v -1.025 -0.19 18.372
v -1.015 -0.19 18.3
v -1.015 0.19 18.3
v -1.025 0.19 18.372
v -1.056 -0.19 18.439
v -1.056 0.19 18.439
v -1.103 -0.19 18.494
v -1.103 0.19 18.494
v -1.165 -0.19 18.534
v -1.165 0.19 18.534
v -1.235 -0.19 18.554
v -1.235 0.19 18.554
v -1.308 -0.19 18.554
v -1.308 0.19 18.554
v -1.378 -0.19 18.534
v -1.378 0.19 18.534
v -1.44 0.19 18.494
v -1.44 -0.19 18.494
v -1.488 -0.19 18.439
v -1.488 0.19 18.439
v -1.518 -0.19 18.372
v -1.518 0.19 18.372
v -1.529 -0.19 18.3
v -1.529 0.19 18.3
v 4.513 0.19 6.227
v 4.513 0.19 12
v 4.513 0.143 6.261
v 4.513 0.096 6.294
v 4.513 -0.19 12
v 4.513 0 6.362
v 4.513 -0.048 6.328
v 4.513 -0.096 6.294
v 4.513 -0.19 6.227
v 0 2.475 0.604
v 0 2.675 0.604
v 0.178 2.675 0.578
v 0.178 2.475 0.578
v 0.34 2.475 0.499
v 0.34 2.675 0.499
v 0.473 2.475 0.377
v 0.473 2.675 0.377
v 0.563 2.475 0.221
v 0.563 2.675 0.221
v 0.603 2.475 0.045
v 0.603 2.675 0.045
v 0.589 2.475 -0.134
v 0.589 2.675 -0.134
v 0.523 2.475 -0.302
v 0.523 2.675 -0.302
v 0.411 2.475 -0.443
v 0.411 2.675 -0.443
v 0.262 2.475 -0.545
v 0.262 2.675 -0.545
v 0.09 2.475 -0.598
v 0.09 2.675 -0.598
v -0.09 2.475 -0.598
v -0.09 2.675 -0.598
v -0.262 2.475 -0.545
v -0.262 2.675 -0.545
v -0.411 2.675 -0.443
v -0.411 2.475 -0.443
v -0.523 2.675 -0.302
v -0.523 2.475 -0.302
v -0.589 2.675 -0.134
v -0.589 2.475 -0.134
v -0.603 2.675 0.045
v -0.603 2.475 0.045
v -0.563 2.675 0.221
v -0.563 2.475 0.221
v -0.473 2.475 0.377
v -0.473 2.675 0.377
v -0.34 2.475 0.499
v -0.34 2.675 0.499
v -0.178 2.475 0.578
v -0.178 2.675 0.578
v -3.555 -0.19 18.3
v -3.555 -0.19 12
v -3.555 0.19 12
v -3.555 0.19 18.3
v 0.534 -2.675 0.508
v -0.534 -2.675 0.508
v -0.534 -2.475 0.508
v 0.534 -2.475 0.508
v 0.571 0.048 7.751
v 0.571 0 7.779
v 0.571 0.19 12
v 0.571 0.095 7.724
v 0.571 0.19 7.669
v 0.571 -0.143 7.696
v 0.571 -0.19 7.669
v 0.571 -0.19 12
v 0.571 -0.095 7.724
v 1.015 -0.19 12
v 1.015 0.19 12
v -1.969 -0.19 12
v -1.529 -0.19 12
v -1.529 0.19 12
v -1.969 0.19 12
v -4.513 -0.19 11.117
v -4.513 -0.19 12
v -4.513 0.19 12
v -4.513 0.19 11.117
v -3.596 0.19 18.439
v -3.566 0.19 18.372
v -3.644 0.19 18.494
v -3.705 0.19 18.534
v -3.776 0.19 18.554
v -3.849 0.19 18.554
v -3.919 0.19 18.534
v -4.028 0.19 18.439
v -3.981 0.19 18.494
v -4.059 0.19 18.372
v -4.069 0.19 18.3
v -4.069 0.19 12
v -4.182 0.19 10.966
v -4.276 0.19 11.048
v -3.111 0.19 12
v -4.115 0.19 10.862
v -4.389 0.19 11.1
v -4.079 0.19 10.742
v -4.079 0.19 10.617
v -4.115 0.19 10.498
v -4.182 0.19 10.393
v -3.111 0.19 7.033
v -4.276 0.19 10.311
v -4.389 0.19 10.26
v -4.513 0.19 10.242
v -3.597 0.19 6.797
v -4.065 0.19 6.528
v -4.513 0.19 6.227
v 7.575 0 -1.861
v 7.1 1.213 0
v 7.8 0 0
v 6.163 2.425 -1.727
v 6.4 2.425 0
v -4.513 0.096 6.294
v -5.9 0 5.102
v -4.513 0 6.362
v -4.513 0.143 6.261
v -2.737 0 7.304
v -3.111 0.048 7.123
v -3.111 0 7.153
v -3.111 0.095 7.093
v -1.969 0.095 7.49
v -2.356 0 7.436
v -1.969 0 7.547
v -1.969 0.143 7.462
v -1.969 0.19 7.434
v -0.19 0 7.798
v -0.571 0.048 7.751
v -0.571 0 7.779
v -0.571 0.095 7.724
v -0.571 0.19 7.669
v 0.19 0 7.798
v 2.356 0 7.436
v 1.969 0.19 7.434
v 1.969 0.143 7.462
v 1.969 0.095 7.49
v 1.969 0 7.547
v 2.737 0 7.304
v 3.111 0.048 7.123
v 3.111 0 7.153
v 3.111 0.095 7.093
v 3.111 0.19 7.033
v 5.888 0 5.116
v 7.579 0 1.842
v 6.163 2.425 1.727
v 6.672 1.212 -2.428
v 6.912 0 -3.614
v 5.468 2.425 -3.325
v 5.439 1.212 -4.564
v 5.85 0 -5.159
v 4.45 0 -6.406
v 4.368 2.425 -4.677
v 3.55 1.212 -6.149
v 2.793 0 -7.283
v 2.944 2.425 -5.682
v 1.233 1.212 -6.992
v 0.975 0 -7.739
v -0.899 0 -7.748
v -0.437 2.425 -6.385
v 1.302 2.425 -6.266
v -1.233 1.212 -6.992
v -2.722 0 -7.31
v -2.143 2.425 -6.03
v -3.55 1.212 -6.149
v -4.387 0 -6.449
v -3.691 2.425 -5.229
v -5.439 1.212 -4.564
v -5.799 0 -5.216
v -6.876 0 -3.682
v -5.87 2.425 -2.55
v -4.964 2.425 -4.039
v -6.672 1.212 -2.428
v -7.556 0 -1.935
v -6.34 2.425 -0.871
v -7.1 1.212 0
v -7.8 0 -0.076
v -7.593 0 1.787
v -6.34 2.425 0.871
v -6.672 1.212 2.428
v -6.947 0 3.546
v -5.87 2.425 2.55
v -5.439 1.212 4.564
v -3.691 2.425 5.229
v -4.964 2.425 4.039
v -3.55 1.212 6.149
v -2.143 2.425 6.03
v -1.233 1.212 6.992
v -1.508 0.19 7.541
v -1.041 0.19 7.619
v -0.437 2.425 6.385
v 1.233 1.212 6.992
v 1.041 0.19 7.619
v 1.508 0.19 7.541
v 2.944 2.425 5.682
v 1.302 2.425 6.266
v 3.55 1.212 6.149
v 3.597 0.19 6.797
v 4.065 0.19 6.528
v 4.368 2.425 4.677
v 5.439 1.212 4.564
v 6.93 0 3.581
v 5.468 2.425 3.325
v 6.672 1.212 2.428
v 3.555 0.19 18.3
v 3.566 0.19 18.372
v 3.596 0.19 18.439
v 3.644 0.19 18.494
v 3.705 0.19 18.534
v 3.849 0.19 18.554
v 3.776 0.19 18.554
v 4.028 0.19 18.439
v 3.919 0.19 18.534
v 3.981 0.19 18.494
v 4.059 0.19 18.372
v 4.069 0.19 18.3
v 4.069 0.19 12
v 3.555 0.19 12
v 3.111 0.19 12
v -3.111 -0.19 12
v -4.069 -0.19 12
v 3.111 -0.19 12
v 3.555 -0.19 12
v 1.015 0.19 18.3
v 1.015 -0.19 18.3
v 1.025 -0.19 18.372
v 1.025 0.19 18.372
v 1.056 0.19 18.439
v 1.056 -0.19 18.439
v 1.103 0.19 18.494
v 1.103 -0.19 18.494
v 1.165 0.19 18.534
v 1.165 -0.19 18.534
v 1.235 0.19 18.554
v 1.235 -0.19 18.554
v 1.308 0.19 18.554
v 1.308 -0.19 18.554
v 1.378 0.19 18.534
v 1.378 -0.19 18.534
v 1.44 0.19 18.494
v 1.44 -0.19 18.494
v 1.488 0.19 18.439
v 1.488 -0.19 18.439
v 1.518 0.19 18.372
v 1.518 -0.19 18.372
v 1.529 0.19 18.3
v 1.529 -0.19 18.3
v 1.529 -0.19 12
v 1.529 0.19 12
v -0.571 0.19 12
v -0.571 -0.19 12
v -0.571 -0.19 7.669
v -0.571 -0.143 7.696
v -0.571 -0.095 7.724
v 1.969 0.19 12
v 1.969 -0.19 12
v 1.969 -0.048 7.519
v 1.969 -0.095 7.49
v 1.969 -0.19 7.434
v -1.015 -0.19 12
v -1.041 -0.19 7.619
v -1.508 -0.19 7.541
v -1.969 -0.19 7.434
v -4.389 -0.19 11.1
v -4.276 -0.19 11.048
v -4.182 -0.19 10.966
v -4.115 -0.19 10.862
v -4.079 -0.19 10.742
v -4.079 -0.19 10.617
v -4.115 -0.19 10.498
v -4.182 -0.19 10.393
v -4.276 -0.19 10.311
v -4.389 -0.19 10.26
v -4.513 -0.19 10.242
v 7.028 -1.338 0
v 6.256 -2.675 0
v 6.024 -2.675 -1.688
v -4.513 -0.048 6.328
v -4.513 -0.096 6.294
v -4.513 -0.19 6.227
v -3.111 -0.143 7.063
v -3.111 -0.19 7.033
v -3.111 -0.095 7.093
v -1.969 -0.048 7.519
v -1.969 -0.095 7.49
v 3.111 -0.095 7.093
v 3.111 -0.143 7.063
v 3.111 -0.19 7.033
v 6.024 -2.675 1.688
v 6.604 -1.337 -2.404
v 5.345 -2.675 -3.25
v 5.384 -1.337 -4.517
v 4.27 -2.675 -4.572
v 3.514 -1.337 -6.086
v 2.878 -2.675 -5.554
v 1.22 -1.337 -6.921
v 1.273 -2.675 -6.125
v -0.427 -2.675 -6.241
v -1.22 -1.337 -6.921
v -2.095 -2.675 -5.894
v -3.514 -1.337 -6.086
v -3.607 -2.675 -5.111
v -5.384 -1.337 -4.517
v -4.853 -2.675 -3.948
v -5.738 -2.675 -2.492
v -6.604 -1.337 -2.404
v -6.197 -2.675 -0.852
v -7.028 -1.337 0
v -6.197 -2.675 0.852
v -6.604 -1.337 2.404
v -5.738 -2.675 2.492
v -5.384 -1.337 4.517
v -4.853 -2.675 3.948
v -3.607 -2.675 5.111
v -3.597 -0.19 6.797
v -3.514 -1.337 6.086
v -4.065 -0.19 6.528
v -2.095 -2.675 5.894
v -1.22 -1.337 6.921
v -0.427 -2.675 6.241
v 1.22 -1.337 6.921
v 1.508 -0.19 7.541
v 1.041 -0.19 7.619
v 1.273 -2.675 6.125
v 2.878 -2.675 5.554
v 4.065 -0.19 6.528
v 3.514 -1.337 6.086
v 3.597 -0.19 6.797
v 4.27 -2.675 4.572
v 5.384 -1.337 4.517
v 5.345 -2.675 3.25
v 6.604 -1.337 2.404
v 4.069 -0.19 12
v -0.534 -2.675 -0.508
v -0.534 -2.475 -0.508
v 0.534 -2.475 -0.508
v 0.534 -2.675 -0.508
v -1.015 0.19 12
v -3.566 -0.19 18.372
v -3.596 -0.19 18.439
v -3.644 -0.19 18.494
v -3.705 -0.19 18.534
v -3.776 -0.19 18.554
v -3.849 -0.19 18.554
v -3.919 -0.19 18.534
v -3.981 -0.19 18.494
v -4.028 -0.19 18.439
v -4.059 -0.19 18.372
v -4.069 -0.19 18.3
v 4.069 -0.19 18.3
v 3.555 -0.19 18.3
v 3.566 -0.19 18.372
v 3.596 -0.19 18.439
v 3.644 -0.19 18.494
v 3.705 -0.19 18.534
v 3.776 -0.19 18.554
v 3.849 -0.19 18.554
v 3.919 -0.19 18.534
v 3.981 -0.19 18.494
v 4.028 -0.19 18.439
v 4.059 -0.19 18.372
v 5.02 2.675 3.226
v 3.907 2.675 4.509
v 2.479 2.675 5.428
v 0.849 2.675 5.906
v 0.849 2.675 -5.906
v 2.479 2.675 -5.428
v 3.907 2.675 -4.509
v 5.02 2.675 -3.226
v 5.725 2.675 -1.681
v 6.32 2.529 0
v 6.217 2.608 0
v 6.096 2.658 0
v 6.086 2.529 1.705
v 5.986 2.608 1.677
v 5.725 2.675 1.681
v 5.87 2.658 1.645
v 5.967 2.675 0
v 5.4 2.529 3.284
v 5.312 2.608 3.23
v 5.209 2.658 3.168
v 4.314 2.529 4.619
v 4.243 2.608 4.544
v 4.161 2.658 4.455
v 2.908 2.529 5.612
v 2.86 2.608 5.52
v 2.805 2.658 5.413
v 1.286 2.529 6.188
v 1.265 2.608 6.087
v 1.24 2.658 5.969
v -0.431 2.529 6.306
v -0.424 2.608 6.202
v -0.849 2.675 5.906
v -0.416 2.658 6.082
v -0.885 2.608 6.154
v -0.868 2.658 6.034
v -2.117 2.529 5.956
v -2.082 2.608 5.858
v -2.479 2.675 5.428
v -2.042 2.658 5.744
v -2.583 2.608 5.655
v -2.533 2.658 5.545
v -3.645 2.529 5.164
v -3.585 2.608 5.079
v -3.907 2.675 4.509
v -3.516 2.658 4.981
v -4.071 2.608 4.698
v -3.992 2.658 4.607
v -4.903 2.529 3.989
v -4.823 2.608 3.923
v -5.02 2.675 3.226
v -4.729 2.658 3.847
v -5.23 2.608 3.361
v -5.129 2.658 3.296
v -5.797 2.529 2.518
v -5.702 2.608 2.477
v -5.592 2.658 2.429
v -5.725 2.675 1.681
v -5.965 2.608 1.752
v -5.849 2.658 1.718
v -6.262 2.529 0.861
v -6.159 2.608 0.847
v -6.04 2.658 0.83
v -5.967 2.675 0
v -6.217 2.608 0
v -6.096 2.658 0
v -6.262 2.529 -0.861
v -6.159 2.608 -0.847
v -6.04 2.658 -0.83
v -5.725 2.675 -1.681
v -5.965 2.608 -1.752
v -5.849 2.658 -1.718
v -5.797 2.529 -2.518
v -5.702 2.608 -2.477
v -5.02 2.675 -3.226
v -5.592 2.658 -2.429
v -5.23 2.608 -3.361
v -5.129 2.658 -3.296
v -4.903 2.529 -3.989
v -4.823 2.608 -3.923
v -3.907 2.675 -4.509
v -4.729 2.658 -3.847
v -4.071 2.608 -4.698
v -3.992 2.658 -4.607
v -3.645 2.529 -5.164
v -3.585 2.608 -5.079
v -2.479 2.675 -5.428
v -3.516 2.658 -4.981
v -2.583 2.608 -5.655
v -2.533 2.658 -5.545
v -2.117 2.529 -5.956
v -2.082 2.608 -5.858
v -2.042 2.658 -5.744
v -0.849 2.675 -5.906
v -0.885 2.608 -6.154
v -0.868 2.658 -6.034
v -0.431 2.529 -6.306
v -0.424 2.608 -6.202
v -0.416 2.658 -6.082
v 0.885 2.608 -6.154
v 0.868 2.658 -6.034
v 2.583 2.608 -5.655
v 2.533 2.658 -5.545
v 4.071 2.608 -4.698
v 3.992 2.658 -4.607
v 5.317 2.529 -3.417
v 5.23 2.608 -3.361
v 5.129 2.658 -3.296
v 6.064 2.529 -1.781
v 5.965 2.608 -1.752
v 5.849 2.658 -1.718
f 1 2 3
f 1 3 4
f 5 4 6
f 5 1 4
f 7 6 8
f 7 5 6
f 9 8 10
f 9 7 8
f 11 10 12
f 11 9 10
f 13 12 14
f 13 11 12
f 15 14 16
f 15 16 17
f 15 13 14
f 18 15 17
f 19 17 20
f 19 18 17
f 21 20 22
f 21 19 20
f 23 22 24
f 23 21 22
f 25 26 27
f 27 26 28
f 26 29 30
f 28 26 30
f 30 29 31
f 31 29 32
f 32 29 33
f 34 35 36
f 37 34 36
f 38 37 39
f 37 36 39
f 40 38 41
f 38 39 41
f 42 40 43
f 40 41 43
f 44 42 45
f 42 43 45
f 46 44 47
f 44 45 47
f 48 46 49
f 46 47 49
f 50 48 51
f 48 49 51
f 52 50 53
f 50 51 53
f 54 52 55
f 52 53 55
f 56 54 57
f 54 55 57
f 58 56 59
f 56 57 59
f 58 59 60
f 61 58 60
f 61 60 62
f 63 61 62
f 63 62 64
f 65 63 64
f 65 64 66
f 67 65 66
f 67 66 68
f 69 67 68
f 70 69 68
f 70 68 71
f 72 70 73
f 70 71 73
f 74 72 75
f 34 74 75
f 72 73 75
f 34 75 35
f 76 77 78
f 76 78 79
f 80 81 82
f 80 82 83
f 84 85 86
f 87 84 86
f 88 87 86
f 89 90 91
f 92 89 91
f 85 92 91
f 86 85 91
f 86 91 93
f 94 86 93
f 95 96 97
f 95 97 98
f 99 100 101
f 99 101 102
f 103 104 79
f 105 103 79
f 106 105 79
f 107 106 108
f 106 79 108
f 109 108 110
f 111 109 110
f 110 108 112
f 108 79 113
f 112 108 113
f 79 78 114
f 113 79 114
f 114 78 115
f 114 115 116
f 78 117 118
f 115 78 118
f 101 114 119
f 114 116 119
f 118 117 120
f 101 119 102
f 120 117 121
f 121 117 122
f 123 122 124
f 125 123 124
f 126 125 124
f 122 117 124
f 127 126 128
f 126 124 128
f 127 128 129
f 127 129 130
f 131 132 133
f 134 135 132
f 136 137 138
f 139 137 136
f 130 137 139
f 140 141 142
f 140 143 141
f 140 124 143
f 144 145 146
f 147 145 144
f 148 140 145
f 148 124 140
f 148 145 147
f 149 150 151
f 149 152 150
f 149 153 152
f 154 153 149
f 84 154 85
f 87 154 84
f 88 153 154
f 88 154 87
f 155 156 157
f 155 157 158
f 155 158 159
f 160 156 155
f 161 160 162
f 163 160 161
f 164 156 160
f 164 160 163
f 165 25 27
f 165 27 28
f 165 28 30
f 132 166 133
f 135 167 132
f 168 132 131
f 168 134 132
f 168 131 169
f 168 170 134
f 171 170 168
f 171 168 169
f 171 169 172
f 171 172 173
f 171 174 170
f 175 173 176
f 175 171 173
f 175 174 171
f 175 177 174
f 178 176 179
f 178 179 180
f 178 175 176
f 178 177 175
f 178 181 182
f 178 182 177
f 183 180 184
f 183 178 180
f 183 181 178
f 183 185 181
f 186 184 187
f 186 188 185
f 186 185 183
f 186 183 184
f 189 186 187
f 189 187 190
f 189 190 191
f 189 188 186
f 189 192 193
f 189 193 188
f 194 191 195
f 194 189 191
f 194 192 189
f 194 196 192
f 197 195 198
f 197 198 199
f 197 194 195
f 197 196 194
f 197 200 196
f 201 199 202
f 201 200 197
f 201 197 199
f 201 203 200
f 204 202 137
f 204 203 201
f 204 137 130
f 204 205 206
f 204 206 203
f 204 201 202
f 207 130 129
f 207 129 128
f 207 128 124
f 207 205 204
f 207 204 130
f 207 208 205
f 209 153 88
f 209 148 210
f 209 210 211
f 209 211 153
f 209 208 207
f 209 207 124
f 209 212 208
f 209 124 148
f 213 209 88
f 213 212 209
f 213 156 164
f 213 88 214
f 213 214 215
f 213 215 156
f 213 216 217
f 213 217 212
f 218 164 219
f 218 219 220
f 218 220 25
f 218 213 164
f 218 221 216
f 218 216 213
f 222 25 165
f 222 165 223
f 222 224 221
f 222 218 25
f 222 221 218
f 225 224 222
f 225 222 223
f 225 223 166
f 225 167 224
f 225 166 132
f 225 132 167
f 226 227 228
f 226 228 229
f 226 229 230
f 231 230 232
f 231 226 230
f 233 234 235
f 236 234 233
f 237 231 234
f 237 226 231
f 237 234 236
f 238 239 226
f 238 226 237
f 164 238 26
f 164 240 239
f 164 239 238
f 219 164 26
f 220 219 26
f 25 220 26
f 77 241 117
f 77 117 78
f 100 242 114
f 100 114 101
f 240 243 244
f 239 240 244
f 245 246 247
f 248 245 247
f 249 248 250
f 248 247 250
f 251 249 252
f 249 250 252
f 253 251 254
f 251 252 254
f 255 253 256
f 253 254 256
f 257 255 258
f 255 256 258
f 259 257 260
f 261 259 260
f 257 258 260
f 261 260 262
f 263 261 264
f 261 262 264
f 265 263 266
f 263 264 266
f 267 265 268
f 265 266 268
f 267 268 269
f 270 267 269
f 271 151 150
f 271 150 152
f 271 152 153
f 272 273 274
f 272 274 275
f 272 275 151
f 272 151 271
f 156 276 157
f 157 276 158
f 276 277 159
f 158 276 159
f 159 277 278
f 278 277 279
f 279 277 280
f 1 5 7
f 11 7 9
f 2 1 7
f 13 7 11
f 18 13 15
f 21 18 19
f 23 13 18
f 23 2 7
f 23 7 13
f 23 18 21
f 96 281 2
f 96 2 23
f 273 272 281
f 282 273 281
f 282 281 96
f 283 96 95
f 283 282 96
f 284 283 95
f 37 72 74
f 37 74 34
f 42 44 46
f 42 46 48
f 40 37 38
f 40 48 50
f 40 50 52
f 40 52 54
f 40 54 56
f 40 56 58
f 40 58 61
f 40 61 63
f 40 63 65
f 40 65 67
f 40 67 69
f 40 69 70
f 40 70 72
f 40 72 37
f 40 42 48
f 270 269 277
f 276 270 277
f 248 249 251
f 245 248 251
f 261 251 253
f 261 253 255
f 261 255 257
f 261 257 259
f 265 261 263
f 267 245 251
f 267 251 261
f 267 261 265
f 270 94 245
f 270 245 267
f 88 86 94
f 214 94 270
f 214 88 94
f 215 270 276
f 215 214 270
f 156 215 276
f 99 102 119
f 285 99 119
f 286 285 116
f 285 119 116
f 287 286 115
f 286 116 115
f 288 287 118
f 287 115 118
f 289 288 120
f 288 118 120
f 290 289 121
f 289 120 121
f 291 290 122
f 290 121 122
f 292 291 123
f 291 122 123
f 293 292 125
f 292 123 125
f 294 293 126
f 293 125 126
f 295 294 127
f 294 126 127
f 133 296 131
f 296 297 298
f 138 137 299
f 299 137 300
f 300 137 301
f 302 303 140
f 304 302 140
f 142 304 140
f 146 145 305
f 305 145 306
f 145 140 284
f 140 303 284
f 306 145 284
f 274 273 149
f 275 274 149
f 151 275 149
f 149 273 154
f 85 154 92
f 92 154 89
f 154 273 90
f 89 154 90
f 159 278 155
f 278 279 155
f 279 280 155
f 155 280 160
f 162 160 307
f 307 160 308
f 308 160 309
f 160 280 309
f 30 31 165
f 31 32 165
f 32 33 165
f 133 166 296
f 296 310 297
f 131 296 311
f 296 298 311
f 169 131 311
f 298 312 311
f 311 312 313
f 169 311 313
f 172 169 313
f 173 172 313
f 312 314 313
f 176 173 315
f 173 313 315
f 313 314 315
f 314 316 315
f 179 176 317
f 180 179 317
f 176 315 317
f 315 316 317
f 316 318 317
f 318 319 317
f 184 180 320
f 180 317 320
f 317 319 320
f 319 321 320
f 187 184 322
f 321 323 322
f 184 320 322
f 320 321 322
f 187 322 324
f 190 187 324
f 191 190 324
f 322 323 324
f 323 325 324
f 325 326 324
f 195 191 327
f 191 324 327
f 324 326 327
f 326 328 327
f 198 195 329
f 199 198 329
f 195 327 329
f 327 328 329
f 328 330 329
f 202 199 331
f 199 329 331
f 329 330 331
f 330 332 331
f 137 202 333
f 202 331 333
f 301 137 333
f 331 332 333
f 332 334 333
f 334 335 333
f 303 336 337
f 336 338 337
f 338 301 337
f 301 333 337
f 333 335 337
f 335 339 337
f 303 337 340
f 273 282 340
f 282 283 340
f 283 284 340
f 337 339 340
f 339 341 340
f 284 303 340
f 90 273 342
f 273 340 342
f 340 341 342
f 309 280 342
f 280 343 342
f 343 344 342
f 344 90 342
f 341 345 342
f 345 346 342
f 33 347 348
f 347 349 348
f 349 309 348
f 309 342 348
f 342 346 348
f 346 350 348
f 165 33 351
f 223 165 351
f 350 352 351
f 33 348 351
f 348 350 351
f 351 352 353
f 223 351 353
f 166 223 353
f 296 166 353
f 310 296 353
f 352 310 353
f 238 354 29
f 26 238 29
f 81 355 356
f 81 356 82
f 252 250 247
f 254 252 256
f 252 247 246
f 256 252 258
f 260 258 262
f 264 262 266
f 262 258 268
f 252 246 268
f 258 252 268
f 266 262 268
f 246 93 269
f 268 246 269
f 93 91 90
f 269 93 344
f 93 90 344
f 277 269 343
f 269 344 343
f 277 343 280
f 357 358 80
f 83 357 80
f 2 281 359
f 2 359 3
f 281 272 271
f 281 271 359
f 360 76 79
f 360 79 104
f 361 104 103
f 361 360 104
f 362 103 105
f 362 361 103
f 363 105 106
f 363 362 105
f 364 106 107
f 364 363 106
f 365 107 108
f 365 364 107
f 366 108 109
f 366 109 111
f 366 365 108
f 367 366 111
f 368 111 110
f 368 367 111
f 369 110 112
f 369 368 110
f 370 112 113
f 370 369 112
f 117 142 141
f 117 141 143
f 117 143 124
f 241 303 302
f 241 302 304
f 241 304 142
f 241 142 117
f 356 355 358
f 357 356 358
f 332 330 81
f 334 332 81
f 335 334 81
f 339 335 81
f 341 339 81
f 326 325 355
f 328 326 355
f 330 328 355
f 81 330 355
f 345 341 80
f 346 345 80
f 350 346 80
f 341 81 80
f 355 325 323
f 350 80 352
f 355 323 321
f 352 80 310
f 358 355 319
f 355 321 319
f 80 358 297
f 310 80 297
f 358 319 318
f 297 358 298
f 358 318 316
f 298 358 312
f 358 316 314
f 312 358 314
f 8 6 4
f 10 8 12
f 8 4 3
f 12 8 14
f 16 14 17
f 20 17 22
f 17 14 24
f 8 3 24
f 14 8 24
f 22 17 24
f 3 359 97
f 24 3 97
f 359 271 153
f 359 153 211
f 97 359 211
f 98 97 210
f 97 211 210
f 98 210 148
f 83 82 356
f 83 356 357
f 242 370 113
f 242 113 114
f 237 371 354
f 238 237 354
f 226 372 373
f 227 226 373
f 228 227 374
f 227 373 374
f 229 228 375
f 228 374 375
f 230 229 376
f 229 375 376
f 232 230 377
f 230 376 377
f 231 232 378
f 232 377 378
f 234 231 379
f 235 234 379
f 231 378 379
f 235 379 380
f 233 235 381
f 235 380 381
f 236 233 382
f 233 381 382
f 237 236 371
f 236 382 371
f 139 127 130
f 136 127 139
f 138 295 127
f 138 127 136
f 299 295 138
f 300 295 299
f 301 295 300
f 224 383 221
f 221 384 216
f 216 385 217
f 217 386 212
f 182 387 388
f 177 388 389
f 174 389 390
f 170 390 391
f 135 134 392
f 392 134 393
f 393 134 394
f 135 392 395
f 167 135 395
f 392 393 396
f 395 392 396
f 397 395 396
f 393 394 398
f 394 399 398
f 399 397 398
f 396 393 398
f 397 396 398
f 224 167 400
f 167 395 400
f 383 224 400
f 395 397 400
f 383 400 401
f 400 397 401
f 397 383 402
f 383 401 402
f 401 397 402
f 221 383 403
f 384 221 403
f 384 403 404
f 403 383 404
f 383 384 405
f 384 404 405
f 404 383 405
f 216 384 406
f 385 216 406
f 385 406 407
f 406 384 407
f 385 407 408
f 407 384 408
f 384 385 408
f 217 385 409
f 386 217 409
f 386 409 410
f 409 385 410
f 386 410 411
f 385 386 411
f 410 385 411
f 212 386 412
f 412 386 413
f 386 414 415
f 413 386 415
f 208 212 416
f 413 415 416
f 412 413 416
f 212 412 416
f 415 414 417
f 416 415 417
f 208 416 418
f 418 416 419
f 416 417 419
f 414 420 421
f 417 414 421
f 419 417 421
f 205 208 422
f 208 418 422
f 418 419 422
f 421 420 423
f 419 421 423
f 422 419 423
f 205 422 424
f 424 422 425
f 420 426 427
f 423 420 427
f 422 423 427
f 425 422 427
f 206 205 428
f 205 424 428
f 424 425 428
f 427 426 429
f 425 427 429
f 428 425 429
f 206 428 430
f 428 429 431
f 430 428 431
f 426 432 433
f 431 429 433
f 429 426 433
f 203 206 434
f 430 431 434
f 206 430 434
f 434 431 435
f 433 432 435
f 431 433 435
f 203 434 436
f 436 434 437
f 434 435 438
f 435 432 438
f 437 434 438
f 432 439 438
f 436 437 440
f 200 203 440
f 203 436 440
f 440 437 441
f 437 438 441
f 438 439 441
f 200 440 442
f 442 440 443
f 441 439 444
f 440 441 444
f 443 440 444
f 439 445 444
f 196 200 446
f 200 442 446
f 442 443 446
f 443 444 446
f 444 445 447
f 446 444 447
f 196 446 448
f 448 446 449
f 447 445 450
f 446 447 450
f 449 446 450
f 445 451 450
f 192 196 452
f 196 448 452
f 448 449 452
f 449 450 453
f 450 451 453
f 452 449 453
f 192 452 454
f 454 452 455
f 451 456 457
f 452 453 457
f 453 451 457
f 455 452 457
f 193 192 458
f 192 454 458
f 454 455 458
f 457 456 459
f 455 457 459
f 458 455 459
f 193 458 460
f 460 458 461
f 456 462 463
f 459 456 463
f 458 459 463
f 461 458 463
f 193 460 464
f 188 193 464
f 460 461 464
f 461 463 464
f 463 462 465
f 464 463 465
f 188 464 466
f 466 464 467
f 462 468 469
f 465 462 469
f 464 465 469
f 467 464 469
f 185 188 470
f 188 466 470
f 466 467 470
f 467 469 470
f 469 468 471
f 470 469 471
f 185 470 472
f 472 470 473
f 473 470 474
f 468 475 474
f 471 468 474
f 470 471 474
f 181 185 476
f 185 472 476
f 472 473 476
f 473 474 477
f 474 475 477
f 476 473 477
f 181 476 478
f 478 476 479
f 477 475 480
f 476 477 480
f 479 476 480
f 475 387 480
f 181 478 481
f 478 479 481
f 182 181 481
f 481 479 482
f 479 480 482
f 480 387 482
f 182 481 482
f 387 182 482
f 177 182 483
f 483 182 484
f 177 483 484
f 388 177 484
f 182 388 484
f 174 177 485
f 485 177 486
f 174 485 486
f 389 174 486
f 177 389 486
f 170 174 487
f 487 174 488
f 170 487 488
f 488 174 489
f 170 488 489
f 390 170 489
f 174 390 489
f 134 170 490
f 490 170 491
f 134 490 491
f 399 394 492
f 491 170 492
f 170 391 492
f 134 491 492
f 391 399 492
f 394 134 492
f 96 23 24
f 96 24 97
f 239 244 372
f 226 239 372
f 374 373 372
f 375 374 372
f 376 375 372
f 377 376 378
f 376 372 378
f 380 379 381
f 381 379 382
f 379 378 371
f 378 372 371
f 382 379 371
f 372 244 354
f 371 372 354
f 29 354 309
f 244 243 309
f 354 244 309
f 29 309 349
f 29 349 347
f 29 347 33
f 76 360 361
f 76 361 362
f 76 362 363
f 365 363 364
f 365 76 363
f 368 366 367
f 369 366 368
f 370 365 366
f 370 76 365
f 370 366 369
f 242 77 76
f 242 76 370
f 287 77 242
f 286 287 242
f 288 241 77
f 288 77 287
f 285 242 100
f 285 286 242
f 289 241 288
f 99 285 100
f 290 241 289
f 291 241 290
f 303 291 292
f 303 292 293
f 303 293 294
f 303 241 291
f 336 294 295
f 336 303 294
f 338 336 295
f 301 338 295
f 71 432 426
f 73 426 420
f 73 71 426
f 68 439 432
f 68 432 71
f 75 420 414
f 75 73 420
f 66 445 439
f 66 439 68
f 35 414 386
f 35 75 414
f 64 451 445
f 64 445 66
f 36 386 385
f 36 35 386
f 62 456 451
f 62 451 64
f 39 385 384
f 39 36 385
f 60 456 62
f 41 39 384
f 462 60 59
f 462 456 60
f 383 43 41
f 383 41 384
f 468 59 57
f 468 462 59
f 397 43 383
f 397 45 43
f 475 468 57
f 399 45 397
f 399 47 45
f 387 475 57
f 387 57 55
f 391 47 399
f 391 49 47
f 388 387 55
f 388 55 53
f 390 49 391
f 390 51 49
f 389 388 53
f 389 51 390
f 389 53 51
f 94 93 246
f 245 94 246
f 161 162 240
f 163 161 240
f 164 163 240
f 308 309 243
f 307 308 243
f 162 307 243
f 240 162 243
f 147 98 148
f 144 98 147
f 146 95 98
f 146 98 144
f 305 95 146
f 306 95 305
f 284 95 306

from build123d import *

# Parameters (mm, degrees)
ESQUISSE1_R                  = 7.8
BOSS_EXTRU_1_DEPTH           = 2.675
BOSS_EXTRU_1_TAPER           = 30
BOSS_EXTRU_1_OTHER_WAY_DEPTH = 2.675
BOSS_EXTRU_1_OTHER_WAY_TAPER = 30
BOSS_EXTRU_2_DEPTH           = 0.19
BOSS_EXTRU_2_DEPTH_BACK      = 0.19
ENL_V_MAT_EXTRU_1_DEPTH      = 1.19
ESQUISSE4_R                  = 0.604402157
ENL_V_MAT_EXTRU_2_DEPTH      = 0.2
ESQUISSE5_W                  = 1.06783848
ESQUISSE5_H                  = 1.016251764
ENL_V_MAT_EXTRU_3_DEPTH      = 0.2
CONG_1_R                     = 0.5


with BuildPart() as part:
    # Esquisse1 → Boss.-Extru.1 (new body)
    with BuildSketch(Plane(origin=(0, 0, 0), x_dir=(1, 0, 0), z_dir=(0, 1, 0))):
        Circle(ESQUISSE1_R)
    extrude(amount=BOSS_EXTRU_1_DEPTH, taper=BOSS_EXTRU_1_TAPER)

    # Esquisse1 → Boss.-Extru.1 other way (add)
    with BuildSketch(Plane(origin=(0, 0, 0), x_dir=(1, 0, 0), z_dir=(0, 1, 0))):
        Circle(ESQUISSE1_R)
    extrude(amount=-BOSS_EXTRU_1_OTHER_WAY_DEPTH, taper=BOSS_EXTRU_1_OTHER_WAY_TAPER)

    # Esquisse2 → Boss.-Extru.2 (add, two sides: drawn at the far end of the back side and taken through both)
    with BuildSketch(Plane(origin=(0, 0, 0), x_dir=(1, 0, 0), z_dir=(0, 1, 0)).offset(-BOSS_EXTRU_2_DEPTH_BACK)):
        with BuildLine():
            Line((1.969010028, -12), (1.969010028, -5.174670877))
            Line((1.969010028, -5.174670877), (0.570530435, -5.174670877))
            Line((0.570530435, -5.174670877), (0.570530435, -12))
            Line((0.570530435, -12), (1.014706926, -12))
            Line((1.014706926, -12), (1.014706926, -18.3))
            ThreePointArc((1.014706926, -18.3), (1.271696248, -18.556989322), (1.52868557, -18.3))
            Line((1.52868557, -18.3), (1.52868557, -12))
            Line((1.52868557, -12), (1.969010028, -12))
        make_face()
        with BuildLine():
            Line((4.069208585, -18.3), (4.069208585, -12))
            Line((4.069208585, -12), (4.512824501, -12))
            Line((4.512824501, -12), (4.512824501, -5.174670877))
            Line((4.512824501, -5.174670877), (3.110830289, -5.174670877))
            Line((3.110830289, -5.174670877), (3.110830289, -12))
            Line((3.110830289, -12), (3.555229941, -12))
            Line((3.555229941, -12), (3.555229941, -18.3))
            ThreePointArc((3.555229941, -18.3), (3.812219263, -18.556989322), (4.069208585, -18.3))
        make_face()
        with BuildLine():
            Line((-0.570530435, -5.174670877), (-0.570530435, -12))
            Line((-0.570530435, -12), (-1.014706926, -12))
            Line((-1.014706926, -12), (-1.014706926, -18.3))
            ThreePointArc((-1.014706926, -18.3), (-1.271696248, -18.556989322), (-1.52868557, -18.3))
            Line((-1.52868557, -18.3), (-1.52868557, -12))
            Line((-1.52868557, -12), (-1.969010028, -12))
            Line((-1.969010028, -12), (-1.969010028, -5.174670877))
            Line((-1.969010028, -5.174670877), (-0.570530435, -5.174670877))
        make_face()
        with BuildLine():
            Line((-4.512824501, -5.174670877), (-3.110830289, -5.174670877))
            Line((-3.110830289, -5.174670877), (-3.110830289, -12))
            Line((-3.110830289, -12), (-3.555229941, -12))
            Line((-3.555229941, -12), (-3.555229941, -18.3))
            ThreePointArc((-3.555229941, -18.3), (-3.812219263, -18.556989322), (-4.069208585, -18.3))
            Line((-4.069208585, -18.3), (-4.069208585, -12))
            Line((-4.069208585, -12), (-4.512824501, -12))
            Line((-4.512824501, -12), (-4.512824501, -5.174670877))
        make_face()
    extrude(amount=BOSS_EXTRU_2_DEPTH + BOSS_EXTRU_2_DEPTH_BACK)

    # Esquisse3 → Enlèv. mat.-Extru.1 (cut)
    with BuildSketch(Plane(origin=(0, 0.19, 0), x_dir=(1, 0, 0), z_dir=(0, 1, 0))):
        with BuildLine():
            Line((-4.512824501, -10.241819979), (-4.512824501, -11.117491511))
            ThreePointArc((-4.512824501, -11.117491511), (-4.074988736, -10.679655745), (-4.512824501, -10.241819979))
        make_face()
    extrude(amount=-ENL_V_MAT_EXTRU_1_DEPTH, mode=Mode.SUBTRACT)

    # Esquisse4 → Enlèv. mat.-Extru.2 (cut)
    with BuildSketch(Plane(origin=(0, 2.675, 0), x_dir=(1, 0, 0), z_dir=(0, 1, 0))):
        with Locations(Location((0, 0, 0), (0, 0, 270))):
            Circle(ESQUISSE4_R)
    extrude(amount=-ENL_V_MAT_EXTRU_2_DEPTH, mode=Mode.SUBTRACT)

    # Esquisse5 → Enlèv. mat.-Extru.3 (cut)
    with BuildSketch(Plane.XZ.offset(2.675)):
        Rectangle(ESQUISSE5_W, ESQUISSE5_H)
    extrude(amount=-ENL_V_MAT_EXTRU_3_DEPTH, mode=Mode.SUBTRACT)

    # Congé1
    cong_1_edges = [part.edges().sort_by_distance(p)[0] for p in [
        (-6.25558803, 2.675, 0),
    ]]
    fillet(cong_1_edges, radius=CONG_1_R)


solid = part.part
